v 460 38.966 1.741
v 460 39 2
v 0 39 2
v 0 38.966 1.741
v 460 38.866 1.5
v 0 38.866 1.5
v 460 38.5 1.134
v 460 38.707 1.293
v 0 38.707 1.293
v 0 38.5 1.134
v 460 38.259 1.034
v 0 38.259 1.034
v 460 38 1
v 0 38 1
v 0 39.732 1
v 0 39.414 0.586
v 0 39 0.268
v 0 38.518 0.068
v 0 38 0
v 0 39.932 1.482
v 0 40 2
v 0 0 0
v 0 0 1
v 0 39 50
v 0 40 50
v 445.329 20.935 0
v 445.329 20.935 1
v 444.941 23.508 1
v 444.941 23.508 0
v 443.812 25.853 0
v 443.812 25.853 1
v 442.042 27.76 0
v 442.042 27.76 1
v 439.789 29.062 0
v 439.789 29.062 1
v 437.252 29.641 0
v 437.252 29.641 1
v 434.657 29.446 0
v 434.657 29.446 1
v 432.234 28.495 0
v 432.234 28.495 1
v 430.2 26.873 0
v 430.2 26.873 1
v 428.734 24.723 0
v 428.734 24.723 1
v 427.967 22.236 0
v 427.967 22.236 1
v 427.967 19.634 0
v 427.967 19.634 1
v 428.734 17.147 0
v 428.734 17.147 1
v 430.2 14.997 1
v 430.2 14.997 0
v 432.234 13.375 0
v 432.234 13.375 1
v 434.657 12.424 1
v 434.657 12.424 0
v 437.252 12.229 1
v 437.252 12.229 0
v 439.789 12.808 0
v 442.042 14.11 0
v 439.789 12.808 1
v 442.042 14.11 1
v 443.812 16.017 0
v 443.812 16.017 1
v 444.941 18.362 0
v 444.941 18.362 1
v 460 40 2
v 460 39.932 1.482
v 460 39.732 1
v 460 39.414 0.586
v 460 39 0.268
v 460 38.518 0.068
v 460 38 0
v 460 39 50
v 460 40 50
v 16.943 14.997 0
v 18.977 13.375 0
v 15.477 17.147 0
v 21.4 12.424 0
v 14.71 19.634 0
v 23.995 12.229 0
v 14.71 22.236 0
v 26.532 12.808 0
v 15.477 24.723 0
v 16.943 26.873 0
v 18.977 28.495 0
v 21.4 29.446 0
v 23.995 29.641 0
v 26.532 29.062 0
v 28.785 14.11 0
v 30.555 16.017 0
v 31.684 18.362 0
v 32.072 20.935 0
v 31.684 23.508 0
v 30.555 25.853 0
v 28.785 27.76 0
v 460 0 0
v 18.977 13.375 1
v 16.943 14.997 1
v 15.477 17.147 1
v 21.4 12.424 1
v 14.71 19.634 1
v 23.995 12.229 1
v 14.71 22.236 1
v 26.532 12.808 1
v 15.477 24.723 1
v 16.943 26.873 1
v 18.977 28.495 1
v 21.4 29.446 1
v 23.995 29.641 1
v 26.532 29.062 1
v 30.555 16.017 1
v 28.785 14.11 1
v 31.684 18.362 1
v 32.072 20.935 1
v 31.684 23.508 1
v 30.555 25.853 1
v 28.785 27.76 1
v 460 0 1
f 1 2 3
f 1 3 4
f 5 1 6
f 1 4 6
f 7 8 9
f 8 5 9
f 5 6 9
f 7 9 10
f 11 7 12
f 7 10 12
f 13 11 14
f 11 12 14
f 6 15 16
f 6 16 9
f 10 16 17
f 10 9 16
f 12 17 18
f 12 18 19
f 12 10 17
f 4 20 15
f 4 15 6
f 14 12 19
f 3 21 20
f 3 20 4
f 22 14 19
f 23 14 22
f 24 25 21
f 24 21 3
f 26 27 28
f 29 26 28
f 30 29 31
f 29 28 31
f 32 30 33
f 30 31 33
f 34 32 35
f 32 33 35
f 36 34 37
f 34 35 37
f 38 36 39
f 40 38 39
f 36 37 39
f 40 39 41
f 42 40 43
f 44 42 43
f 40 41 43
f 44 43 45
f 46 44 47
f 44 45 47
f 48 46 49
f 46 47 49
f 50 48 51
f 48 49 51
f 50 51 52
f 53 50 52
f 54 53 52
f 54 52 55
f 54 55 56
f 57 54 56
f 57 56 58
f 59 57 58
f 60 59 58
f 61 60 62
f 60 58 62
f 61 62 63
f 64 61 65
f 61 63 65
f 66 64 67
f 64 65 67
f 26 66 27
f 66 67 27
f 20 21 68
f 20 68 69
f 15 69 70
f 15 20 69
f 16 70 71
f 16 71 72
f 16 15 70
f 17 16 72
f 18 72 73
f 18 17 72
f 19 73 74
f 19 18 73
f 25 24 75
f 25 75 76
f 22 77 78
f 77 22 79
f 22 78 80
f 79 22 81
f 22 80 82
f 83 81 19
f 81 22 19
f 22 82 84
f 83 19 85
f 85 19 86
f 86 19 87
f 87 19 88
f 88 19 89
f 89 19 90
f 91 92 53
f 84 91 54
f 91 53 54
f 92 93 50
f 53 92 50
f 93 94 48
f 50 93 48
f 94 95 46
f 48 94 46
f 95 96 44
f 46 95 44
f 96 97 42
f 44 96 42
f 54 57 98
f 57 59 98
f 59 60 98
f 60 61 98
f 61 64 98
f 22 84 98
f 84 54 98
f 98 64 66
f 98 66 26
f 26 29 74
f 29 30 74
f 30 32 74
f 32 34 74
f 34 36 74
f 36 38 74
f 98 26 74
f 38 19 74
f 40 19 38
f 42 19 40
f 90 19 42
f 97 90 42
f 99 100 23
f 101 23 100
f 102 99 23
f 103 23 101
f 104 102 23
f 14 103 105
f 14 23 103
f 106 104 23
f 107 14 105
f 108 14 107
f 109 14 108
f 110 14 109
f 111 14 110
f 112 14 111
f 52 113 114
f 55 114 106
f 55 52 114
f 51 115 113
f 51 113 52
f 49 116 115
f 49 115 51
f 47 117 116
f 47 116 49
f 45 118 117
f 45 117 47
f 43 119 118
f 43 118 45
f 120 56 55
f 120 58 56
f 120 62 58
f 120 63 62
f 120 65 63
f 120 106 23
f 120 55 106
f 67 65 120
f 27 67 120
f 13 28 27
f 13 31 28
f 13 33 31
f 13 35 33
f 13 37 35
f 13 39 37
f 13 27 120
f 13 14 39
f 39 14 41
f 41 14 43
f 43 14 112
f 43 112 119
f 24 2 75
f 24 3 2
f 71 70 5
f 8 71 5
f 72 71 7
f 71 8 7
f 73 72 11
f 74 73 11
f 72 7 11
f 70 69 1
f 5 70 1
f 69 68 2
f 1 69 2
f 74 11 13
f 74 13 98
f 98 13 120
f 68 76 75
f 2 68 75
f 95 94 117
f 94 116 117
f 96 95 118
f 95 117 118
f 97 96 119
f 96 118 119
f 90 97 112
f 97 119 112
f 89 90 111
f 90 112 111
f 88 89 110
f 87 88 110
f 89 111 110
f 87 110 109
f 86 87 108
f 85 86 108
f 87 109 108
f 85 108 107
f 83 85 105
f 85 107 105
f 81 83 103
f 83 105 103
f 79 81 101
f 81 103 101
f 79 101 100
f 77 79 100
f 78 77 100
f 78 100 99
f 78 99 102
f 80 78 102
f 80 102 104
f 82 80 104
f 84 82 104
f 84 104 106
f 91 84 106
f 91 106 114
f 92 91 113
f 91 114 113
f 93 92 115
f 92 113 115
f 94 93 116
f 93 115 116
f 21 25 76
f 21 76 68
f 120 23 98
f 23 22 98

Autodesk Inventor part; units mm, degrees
ref_plane "YZ Plane" through (0, 0, 0) normal (1, 0, 0) x (0, 1, 0)
ref_plane "XZ Plane" through (0, 0, 0) normal (0, 1, 0) x (-1, 0, 0)
ref_plane "XY Plane" through (0, 0, 0) normal (0, 0, 1) x (1, 0, 0)
sketch "Boceto1" plane through (0, 0, 0) normal (0, 0, 1) x (1, 0, 0)
  line L0 (0, 0) -> (460, 0)
  line L1 (460, 0) -> (460, 40)
  line L2 (460, 40) -> (0, 40)
  line L3 (0, 40) -> (0, 0)
  dimension "d0" = 460
  dimension "d1" = 40
extrude "Placa1" add sketch "Boceto1" along normal blind 1
sketch "Boceto2" plane through (0, 39, 0) normal (0, 1, 0) x (-1, 0, 0)
  line L0 (-460, 0) -> (0, 0)
  line L1 (0, 0) -> (0, 50)
  line L2 (0, 50) -> (-460, 50)
  line L3 (-460, 50) -> (-460, 0)
edge flange "Pestaña1" height 50 angle 90 thickness 1 bend radius 1 thickness toward (0, 1, 0) relief tear relief width 1 relief depth 0.5 edges at (230, 40, 1) wall of the first edge with corners at (460, 39, 0) (0, 39, 0) (0, 39, 50) (460, 39, 50)
bend "Doblez1"
corner "Esquina1"
sketch "Boceto3" plane through (0, 0, 1) normal (0, 0, 1) x (1, 0, 0)
  circle A0 centre (23.3423, 20.935) radius 8.73
  circle A1 centre (436.5993, 20.935) radius 8.73
  line L0 (0, 0) -> (0, 38) projected
  line L1 (460, 40) -> (0, 40) projected
  dimension "d13" = 413.257
  dimension "d14" = 23.3423
  dimension "d15" = 17.46
  dimension "d16" = 17.46
  dimension "d17" = 19.065
extrude "Extrusión1" cut sketch "Boceto3" against normal blind 10
equation "\"d16\" = d15"
equation "\"d2\" = Grosor"
equation "\"d3\" = Anchura_desahogo_plegado"
equation "\"d4\" = Profundidad_desahogo_plegado"
equation "\"d5\" = Remanente_mínimo"
equation "\"d6\" = Radiodetransición"
equation "\"d9\" = Radio_pliegue"
equation "\"d10\" = Tamaño_destalonado"
equation "\"d11\" = TamañoSeparación"
equation "\"d12\" = Tamaño_de_radio_de_Jacobi"
equation "\"Radio_pliegue\" = Grosor"
equation "\"Anchura_desahogo_plegado\" = Grosor"
equation "\"Profundidad_desahogo_plegado\" = 0.5 * Grosor"
equation "\"Tamaño_destalonado\" = 4 * Grosor"
equation "\"Remanente_mínimo\" = 2 * Grosor"
equation "\"Radiodetransición\" = Radio_pliegue"
equation "\"Tamaño_de_radio_de_Jacobi\" = Radio_pliegue"
equation "\"TamañoSeparación\" = Grosor"
equation "\"Grosor\" = 1"
properties part number "perfil_fijacion"
